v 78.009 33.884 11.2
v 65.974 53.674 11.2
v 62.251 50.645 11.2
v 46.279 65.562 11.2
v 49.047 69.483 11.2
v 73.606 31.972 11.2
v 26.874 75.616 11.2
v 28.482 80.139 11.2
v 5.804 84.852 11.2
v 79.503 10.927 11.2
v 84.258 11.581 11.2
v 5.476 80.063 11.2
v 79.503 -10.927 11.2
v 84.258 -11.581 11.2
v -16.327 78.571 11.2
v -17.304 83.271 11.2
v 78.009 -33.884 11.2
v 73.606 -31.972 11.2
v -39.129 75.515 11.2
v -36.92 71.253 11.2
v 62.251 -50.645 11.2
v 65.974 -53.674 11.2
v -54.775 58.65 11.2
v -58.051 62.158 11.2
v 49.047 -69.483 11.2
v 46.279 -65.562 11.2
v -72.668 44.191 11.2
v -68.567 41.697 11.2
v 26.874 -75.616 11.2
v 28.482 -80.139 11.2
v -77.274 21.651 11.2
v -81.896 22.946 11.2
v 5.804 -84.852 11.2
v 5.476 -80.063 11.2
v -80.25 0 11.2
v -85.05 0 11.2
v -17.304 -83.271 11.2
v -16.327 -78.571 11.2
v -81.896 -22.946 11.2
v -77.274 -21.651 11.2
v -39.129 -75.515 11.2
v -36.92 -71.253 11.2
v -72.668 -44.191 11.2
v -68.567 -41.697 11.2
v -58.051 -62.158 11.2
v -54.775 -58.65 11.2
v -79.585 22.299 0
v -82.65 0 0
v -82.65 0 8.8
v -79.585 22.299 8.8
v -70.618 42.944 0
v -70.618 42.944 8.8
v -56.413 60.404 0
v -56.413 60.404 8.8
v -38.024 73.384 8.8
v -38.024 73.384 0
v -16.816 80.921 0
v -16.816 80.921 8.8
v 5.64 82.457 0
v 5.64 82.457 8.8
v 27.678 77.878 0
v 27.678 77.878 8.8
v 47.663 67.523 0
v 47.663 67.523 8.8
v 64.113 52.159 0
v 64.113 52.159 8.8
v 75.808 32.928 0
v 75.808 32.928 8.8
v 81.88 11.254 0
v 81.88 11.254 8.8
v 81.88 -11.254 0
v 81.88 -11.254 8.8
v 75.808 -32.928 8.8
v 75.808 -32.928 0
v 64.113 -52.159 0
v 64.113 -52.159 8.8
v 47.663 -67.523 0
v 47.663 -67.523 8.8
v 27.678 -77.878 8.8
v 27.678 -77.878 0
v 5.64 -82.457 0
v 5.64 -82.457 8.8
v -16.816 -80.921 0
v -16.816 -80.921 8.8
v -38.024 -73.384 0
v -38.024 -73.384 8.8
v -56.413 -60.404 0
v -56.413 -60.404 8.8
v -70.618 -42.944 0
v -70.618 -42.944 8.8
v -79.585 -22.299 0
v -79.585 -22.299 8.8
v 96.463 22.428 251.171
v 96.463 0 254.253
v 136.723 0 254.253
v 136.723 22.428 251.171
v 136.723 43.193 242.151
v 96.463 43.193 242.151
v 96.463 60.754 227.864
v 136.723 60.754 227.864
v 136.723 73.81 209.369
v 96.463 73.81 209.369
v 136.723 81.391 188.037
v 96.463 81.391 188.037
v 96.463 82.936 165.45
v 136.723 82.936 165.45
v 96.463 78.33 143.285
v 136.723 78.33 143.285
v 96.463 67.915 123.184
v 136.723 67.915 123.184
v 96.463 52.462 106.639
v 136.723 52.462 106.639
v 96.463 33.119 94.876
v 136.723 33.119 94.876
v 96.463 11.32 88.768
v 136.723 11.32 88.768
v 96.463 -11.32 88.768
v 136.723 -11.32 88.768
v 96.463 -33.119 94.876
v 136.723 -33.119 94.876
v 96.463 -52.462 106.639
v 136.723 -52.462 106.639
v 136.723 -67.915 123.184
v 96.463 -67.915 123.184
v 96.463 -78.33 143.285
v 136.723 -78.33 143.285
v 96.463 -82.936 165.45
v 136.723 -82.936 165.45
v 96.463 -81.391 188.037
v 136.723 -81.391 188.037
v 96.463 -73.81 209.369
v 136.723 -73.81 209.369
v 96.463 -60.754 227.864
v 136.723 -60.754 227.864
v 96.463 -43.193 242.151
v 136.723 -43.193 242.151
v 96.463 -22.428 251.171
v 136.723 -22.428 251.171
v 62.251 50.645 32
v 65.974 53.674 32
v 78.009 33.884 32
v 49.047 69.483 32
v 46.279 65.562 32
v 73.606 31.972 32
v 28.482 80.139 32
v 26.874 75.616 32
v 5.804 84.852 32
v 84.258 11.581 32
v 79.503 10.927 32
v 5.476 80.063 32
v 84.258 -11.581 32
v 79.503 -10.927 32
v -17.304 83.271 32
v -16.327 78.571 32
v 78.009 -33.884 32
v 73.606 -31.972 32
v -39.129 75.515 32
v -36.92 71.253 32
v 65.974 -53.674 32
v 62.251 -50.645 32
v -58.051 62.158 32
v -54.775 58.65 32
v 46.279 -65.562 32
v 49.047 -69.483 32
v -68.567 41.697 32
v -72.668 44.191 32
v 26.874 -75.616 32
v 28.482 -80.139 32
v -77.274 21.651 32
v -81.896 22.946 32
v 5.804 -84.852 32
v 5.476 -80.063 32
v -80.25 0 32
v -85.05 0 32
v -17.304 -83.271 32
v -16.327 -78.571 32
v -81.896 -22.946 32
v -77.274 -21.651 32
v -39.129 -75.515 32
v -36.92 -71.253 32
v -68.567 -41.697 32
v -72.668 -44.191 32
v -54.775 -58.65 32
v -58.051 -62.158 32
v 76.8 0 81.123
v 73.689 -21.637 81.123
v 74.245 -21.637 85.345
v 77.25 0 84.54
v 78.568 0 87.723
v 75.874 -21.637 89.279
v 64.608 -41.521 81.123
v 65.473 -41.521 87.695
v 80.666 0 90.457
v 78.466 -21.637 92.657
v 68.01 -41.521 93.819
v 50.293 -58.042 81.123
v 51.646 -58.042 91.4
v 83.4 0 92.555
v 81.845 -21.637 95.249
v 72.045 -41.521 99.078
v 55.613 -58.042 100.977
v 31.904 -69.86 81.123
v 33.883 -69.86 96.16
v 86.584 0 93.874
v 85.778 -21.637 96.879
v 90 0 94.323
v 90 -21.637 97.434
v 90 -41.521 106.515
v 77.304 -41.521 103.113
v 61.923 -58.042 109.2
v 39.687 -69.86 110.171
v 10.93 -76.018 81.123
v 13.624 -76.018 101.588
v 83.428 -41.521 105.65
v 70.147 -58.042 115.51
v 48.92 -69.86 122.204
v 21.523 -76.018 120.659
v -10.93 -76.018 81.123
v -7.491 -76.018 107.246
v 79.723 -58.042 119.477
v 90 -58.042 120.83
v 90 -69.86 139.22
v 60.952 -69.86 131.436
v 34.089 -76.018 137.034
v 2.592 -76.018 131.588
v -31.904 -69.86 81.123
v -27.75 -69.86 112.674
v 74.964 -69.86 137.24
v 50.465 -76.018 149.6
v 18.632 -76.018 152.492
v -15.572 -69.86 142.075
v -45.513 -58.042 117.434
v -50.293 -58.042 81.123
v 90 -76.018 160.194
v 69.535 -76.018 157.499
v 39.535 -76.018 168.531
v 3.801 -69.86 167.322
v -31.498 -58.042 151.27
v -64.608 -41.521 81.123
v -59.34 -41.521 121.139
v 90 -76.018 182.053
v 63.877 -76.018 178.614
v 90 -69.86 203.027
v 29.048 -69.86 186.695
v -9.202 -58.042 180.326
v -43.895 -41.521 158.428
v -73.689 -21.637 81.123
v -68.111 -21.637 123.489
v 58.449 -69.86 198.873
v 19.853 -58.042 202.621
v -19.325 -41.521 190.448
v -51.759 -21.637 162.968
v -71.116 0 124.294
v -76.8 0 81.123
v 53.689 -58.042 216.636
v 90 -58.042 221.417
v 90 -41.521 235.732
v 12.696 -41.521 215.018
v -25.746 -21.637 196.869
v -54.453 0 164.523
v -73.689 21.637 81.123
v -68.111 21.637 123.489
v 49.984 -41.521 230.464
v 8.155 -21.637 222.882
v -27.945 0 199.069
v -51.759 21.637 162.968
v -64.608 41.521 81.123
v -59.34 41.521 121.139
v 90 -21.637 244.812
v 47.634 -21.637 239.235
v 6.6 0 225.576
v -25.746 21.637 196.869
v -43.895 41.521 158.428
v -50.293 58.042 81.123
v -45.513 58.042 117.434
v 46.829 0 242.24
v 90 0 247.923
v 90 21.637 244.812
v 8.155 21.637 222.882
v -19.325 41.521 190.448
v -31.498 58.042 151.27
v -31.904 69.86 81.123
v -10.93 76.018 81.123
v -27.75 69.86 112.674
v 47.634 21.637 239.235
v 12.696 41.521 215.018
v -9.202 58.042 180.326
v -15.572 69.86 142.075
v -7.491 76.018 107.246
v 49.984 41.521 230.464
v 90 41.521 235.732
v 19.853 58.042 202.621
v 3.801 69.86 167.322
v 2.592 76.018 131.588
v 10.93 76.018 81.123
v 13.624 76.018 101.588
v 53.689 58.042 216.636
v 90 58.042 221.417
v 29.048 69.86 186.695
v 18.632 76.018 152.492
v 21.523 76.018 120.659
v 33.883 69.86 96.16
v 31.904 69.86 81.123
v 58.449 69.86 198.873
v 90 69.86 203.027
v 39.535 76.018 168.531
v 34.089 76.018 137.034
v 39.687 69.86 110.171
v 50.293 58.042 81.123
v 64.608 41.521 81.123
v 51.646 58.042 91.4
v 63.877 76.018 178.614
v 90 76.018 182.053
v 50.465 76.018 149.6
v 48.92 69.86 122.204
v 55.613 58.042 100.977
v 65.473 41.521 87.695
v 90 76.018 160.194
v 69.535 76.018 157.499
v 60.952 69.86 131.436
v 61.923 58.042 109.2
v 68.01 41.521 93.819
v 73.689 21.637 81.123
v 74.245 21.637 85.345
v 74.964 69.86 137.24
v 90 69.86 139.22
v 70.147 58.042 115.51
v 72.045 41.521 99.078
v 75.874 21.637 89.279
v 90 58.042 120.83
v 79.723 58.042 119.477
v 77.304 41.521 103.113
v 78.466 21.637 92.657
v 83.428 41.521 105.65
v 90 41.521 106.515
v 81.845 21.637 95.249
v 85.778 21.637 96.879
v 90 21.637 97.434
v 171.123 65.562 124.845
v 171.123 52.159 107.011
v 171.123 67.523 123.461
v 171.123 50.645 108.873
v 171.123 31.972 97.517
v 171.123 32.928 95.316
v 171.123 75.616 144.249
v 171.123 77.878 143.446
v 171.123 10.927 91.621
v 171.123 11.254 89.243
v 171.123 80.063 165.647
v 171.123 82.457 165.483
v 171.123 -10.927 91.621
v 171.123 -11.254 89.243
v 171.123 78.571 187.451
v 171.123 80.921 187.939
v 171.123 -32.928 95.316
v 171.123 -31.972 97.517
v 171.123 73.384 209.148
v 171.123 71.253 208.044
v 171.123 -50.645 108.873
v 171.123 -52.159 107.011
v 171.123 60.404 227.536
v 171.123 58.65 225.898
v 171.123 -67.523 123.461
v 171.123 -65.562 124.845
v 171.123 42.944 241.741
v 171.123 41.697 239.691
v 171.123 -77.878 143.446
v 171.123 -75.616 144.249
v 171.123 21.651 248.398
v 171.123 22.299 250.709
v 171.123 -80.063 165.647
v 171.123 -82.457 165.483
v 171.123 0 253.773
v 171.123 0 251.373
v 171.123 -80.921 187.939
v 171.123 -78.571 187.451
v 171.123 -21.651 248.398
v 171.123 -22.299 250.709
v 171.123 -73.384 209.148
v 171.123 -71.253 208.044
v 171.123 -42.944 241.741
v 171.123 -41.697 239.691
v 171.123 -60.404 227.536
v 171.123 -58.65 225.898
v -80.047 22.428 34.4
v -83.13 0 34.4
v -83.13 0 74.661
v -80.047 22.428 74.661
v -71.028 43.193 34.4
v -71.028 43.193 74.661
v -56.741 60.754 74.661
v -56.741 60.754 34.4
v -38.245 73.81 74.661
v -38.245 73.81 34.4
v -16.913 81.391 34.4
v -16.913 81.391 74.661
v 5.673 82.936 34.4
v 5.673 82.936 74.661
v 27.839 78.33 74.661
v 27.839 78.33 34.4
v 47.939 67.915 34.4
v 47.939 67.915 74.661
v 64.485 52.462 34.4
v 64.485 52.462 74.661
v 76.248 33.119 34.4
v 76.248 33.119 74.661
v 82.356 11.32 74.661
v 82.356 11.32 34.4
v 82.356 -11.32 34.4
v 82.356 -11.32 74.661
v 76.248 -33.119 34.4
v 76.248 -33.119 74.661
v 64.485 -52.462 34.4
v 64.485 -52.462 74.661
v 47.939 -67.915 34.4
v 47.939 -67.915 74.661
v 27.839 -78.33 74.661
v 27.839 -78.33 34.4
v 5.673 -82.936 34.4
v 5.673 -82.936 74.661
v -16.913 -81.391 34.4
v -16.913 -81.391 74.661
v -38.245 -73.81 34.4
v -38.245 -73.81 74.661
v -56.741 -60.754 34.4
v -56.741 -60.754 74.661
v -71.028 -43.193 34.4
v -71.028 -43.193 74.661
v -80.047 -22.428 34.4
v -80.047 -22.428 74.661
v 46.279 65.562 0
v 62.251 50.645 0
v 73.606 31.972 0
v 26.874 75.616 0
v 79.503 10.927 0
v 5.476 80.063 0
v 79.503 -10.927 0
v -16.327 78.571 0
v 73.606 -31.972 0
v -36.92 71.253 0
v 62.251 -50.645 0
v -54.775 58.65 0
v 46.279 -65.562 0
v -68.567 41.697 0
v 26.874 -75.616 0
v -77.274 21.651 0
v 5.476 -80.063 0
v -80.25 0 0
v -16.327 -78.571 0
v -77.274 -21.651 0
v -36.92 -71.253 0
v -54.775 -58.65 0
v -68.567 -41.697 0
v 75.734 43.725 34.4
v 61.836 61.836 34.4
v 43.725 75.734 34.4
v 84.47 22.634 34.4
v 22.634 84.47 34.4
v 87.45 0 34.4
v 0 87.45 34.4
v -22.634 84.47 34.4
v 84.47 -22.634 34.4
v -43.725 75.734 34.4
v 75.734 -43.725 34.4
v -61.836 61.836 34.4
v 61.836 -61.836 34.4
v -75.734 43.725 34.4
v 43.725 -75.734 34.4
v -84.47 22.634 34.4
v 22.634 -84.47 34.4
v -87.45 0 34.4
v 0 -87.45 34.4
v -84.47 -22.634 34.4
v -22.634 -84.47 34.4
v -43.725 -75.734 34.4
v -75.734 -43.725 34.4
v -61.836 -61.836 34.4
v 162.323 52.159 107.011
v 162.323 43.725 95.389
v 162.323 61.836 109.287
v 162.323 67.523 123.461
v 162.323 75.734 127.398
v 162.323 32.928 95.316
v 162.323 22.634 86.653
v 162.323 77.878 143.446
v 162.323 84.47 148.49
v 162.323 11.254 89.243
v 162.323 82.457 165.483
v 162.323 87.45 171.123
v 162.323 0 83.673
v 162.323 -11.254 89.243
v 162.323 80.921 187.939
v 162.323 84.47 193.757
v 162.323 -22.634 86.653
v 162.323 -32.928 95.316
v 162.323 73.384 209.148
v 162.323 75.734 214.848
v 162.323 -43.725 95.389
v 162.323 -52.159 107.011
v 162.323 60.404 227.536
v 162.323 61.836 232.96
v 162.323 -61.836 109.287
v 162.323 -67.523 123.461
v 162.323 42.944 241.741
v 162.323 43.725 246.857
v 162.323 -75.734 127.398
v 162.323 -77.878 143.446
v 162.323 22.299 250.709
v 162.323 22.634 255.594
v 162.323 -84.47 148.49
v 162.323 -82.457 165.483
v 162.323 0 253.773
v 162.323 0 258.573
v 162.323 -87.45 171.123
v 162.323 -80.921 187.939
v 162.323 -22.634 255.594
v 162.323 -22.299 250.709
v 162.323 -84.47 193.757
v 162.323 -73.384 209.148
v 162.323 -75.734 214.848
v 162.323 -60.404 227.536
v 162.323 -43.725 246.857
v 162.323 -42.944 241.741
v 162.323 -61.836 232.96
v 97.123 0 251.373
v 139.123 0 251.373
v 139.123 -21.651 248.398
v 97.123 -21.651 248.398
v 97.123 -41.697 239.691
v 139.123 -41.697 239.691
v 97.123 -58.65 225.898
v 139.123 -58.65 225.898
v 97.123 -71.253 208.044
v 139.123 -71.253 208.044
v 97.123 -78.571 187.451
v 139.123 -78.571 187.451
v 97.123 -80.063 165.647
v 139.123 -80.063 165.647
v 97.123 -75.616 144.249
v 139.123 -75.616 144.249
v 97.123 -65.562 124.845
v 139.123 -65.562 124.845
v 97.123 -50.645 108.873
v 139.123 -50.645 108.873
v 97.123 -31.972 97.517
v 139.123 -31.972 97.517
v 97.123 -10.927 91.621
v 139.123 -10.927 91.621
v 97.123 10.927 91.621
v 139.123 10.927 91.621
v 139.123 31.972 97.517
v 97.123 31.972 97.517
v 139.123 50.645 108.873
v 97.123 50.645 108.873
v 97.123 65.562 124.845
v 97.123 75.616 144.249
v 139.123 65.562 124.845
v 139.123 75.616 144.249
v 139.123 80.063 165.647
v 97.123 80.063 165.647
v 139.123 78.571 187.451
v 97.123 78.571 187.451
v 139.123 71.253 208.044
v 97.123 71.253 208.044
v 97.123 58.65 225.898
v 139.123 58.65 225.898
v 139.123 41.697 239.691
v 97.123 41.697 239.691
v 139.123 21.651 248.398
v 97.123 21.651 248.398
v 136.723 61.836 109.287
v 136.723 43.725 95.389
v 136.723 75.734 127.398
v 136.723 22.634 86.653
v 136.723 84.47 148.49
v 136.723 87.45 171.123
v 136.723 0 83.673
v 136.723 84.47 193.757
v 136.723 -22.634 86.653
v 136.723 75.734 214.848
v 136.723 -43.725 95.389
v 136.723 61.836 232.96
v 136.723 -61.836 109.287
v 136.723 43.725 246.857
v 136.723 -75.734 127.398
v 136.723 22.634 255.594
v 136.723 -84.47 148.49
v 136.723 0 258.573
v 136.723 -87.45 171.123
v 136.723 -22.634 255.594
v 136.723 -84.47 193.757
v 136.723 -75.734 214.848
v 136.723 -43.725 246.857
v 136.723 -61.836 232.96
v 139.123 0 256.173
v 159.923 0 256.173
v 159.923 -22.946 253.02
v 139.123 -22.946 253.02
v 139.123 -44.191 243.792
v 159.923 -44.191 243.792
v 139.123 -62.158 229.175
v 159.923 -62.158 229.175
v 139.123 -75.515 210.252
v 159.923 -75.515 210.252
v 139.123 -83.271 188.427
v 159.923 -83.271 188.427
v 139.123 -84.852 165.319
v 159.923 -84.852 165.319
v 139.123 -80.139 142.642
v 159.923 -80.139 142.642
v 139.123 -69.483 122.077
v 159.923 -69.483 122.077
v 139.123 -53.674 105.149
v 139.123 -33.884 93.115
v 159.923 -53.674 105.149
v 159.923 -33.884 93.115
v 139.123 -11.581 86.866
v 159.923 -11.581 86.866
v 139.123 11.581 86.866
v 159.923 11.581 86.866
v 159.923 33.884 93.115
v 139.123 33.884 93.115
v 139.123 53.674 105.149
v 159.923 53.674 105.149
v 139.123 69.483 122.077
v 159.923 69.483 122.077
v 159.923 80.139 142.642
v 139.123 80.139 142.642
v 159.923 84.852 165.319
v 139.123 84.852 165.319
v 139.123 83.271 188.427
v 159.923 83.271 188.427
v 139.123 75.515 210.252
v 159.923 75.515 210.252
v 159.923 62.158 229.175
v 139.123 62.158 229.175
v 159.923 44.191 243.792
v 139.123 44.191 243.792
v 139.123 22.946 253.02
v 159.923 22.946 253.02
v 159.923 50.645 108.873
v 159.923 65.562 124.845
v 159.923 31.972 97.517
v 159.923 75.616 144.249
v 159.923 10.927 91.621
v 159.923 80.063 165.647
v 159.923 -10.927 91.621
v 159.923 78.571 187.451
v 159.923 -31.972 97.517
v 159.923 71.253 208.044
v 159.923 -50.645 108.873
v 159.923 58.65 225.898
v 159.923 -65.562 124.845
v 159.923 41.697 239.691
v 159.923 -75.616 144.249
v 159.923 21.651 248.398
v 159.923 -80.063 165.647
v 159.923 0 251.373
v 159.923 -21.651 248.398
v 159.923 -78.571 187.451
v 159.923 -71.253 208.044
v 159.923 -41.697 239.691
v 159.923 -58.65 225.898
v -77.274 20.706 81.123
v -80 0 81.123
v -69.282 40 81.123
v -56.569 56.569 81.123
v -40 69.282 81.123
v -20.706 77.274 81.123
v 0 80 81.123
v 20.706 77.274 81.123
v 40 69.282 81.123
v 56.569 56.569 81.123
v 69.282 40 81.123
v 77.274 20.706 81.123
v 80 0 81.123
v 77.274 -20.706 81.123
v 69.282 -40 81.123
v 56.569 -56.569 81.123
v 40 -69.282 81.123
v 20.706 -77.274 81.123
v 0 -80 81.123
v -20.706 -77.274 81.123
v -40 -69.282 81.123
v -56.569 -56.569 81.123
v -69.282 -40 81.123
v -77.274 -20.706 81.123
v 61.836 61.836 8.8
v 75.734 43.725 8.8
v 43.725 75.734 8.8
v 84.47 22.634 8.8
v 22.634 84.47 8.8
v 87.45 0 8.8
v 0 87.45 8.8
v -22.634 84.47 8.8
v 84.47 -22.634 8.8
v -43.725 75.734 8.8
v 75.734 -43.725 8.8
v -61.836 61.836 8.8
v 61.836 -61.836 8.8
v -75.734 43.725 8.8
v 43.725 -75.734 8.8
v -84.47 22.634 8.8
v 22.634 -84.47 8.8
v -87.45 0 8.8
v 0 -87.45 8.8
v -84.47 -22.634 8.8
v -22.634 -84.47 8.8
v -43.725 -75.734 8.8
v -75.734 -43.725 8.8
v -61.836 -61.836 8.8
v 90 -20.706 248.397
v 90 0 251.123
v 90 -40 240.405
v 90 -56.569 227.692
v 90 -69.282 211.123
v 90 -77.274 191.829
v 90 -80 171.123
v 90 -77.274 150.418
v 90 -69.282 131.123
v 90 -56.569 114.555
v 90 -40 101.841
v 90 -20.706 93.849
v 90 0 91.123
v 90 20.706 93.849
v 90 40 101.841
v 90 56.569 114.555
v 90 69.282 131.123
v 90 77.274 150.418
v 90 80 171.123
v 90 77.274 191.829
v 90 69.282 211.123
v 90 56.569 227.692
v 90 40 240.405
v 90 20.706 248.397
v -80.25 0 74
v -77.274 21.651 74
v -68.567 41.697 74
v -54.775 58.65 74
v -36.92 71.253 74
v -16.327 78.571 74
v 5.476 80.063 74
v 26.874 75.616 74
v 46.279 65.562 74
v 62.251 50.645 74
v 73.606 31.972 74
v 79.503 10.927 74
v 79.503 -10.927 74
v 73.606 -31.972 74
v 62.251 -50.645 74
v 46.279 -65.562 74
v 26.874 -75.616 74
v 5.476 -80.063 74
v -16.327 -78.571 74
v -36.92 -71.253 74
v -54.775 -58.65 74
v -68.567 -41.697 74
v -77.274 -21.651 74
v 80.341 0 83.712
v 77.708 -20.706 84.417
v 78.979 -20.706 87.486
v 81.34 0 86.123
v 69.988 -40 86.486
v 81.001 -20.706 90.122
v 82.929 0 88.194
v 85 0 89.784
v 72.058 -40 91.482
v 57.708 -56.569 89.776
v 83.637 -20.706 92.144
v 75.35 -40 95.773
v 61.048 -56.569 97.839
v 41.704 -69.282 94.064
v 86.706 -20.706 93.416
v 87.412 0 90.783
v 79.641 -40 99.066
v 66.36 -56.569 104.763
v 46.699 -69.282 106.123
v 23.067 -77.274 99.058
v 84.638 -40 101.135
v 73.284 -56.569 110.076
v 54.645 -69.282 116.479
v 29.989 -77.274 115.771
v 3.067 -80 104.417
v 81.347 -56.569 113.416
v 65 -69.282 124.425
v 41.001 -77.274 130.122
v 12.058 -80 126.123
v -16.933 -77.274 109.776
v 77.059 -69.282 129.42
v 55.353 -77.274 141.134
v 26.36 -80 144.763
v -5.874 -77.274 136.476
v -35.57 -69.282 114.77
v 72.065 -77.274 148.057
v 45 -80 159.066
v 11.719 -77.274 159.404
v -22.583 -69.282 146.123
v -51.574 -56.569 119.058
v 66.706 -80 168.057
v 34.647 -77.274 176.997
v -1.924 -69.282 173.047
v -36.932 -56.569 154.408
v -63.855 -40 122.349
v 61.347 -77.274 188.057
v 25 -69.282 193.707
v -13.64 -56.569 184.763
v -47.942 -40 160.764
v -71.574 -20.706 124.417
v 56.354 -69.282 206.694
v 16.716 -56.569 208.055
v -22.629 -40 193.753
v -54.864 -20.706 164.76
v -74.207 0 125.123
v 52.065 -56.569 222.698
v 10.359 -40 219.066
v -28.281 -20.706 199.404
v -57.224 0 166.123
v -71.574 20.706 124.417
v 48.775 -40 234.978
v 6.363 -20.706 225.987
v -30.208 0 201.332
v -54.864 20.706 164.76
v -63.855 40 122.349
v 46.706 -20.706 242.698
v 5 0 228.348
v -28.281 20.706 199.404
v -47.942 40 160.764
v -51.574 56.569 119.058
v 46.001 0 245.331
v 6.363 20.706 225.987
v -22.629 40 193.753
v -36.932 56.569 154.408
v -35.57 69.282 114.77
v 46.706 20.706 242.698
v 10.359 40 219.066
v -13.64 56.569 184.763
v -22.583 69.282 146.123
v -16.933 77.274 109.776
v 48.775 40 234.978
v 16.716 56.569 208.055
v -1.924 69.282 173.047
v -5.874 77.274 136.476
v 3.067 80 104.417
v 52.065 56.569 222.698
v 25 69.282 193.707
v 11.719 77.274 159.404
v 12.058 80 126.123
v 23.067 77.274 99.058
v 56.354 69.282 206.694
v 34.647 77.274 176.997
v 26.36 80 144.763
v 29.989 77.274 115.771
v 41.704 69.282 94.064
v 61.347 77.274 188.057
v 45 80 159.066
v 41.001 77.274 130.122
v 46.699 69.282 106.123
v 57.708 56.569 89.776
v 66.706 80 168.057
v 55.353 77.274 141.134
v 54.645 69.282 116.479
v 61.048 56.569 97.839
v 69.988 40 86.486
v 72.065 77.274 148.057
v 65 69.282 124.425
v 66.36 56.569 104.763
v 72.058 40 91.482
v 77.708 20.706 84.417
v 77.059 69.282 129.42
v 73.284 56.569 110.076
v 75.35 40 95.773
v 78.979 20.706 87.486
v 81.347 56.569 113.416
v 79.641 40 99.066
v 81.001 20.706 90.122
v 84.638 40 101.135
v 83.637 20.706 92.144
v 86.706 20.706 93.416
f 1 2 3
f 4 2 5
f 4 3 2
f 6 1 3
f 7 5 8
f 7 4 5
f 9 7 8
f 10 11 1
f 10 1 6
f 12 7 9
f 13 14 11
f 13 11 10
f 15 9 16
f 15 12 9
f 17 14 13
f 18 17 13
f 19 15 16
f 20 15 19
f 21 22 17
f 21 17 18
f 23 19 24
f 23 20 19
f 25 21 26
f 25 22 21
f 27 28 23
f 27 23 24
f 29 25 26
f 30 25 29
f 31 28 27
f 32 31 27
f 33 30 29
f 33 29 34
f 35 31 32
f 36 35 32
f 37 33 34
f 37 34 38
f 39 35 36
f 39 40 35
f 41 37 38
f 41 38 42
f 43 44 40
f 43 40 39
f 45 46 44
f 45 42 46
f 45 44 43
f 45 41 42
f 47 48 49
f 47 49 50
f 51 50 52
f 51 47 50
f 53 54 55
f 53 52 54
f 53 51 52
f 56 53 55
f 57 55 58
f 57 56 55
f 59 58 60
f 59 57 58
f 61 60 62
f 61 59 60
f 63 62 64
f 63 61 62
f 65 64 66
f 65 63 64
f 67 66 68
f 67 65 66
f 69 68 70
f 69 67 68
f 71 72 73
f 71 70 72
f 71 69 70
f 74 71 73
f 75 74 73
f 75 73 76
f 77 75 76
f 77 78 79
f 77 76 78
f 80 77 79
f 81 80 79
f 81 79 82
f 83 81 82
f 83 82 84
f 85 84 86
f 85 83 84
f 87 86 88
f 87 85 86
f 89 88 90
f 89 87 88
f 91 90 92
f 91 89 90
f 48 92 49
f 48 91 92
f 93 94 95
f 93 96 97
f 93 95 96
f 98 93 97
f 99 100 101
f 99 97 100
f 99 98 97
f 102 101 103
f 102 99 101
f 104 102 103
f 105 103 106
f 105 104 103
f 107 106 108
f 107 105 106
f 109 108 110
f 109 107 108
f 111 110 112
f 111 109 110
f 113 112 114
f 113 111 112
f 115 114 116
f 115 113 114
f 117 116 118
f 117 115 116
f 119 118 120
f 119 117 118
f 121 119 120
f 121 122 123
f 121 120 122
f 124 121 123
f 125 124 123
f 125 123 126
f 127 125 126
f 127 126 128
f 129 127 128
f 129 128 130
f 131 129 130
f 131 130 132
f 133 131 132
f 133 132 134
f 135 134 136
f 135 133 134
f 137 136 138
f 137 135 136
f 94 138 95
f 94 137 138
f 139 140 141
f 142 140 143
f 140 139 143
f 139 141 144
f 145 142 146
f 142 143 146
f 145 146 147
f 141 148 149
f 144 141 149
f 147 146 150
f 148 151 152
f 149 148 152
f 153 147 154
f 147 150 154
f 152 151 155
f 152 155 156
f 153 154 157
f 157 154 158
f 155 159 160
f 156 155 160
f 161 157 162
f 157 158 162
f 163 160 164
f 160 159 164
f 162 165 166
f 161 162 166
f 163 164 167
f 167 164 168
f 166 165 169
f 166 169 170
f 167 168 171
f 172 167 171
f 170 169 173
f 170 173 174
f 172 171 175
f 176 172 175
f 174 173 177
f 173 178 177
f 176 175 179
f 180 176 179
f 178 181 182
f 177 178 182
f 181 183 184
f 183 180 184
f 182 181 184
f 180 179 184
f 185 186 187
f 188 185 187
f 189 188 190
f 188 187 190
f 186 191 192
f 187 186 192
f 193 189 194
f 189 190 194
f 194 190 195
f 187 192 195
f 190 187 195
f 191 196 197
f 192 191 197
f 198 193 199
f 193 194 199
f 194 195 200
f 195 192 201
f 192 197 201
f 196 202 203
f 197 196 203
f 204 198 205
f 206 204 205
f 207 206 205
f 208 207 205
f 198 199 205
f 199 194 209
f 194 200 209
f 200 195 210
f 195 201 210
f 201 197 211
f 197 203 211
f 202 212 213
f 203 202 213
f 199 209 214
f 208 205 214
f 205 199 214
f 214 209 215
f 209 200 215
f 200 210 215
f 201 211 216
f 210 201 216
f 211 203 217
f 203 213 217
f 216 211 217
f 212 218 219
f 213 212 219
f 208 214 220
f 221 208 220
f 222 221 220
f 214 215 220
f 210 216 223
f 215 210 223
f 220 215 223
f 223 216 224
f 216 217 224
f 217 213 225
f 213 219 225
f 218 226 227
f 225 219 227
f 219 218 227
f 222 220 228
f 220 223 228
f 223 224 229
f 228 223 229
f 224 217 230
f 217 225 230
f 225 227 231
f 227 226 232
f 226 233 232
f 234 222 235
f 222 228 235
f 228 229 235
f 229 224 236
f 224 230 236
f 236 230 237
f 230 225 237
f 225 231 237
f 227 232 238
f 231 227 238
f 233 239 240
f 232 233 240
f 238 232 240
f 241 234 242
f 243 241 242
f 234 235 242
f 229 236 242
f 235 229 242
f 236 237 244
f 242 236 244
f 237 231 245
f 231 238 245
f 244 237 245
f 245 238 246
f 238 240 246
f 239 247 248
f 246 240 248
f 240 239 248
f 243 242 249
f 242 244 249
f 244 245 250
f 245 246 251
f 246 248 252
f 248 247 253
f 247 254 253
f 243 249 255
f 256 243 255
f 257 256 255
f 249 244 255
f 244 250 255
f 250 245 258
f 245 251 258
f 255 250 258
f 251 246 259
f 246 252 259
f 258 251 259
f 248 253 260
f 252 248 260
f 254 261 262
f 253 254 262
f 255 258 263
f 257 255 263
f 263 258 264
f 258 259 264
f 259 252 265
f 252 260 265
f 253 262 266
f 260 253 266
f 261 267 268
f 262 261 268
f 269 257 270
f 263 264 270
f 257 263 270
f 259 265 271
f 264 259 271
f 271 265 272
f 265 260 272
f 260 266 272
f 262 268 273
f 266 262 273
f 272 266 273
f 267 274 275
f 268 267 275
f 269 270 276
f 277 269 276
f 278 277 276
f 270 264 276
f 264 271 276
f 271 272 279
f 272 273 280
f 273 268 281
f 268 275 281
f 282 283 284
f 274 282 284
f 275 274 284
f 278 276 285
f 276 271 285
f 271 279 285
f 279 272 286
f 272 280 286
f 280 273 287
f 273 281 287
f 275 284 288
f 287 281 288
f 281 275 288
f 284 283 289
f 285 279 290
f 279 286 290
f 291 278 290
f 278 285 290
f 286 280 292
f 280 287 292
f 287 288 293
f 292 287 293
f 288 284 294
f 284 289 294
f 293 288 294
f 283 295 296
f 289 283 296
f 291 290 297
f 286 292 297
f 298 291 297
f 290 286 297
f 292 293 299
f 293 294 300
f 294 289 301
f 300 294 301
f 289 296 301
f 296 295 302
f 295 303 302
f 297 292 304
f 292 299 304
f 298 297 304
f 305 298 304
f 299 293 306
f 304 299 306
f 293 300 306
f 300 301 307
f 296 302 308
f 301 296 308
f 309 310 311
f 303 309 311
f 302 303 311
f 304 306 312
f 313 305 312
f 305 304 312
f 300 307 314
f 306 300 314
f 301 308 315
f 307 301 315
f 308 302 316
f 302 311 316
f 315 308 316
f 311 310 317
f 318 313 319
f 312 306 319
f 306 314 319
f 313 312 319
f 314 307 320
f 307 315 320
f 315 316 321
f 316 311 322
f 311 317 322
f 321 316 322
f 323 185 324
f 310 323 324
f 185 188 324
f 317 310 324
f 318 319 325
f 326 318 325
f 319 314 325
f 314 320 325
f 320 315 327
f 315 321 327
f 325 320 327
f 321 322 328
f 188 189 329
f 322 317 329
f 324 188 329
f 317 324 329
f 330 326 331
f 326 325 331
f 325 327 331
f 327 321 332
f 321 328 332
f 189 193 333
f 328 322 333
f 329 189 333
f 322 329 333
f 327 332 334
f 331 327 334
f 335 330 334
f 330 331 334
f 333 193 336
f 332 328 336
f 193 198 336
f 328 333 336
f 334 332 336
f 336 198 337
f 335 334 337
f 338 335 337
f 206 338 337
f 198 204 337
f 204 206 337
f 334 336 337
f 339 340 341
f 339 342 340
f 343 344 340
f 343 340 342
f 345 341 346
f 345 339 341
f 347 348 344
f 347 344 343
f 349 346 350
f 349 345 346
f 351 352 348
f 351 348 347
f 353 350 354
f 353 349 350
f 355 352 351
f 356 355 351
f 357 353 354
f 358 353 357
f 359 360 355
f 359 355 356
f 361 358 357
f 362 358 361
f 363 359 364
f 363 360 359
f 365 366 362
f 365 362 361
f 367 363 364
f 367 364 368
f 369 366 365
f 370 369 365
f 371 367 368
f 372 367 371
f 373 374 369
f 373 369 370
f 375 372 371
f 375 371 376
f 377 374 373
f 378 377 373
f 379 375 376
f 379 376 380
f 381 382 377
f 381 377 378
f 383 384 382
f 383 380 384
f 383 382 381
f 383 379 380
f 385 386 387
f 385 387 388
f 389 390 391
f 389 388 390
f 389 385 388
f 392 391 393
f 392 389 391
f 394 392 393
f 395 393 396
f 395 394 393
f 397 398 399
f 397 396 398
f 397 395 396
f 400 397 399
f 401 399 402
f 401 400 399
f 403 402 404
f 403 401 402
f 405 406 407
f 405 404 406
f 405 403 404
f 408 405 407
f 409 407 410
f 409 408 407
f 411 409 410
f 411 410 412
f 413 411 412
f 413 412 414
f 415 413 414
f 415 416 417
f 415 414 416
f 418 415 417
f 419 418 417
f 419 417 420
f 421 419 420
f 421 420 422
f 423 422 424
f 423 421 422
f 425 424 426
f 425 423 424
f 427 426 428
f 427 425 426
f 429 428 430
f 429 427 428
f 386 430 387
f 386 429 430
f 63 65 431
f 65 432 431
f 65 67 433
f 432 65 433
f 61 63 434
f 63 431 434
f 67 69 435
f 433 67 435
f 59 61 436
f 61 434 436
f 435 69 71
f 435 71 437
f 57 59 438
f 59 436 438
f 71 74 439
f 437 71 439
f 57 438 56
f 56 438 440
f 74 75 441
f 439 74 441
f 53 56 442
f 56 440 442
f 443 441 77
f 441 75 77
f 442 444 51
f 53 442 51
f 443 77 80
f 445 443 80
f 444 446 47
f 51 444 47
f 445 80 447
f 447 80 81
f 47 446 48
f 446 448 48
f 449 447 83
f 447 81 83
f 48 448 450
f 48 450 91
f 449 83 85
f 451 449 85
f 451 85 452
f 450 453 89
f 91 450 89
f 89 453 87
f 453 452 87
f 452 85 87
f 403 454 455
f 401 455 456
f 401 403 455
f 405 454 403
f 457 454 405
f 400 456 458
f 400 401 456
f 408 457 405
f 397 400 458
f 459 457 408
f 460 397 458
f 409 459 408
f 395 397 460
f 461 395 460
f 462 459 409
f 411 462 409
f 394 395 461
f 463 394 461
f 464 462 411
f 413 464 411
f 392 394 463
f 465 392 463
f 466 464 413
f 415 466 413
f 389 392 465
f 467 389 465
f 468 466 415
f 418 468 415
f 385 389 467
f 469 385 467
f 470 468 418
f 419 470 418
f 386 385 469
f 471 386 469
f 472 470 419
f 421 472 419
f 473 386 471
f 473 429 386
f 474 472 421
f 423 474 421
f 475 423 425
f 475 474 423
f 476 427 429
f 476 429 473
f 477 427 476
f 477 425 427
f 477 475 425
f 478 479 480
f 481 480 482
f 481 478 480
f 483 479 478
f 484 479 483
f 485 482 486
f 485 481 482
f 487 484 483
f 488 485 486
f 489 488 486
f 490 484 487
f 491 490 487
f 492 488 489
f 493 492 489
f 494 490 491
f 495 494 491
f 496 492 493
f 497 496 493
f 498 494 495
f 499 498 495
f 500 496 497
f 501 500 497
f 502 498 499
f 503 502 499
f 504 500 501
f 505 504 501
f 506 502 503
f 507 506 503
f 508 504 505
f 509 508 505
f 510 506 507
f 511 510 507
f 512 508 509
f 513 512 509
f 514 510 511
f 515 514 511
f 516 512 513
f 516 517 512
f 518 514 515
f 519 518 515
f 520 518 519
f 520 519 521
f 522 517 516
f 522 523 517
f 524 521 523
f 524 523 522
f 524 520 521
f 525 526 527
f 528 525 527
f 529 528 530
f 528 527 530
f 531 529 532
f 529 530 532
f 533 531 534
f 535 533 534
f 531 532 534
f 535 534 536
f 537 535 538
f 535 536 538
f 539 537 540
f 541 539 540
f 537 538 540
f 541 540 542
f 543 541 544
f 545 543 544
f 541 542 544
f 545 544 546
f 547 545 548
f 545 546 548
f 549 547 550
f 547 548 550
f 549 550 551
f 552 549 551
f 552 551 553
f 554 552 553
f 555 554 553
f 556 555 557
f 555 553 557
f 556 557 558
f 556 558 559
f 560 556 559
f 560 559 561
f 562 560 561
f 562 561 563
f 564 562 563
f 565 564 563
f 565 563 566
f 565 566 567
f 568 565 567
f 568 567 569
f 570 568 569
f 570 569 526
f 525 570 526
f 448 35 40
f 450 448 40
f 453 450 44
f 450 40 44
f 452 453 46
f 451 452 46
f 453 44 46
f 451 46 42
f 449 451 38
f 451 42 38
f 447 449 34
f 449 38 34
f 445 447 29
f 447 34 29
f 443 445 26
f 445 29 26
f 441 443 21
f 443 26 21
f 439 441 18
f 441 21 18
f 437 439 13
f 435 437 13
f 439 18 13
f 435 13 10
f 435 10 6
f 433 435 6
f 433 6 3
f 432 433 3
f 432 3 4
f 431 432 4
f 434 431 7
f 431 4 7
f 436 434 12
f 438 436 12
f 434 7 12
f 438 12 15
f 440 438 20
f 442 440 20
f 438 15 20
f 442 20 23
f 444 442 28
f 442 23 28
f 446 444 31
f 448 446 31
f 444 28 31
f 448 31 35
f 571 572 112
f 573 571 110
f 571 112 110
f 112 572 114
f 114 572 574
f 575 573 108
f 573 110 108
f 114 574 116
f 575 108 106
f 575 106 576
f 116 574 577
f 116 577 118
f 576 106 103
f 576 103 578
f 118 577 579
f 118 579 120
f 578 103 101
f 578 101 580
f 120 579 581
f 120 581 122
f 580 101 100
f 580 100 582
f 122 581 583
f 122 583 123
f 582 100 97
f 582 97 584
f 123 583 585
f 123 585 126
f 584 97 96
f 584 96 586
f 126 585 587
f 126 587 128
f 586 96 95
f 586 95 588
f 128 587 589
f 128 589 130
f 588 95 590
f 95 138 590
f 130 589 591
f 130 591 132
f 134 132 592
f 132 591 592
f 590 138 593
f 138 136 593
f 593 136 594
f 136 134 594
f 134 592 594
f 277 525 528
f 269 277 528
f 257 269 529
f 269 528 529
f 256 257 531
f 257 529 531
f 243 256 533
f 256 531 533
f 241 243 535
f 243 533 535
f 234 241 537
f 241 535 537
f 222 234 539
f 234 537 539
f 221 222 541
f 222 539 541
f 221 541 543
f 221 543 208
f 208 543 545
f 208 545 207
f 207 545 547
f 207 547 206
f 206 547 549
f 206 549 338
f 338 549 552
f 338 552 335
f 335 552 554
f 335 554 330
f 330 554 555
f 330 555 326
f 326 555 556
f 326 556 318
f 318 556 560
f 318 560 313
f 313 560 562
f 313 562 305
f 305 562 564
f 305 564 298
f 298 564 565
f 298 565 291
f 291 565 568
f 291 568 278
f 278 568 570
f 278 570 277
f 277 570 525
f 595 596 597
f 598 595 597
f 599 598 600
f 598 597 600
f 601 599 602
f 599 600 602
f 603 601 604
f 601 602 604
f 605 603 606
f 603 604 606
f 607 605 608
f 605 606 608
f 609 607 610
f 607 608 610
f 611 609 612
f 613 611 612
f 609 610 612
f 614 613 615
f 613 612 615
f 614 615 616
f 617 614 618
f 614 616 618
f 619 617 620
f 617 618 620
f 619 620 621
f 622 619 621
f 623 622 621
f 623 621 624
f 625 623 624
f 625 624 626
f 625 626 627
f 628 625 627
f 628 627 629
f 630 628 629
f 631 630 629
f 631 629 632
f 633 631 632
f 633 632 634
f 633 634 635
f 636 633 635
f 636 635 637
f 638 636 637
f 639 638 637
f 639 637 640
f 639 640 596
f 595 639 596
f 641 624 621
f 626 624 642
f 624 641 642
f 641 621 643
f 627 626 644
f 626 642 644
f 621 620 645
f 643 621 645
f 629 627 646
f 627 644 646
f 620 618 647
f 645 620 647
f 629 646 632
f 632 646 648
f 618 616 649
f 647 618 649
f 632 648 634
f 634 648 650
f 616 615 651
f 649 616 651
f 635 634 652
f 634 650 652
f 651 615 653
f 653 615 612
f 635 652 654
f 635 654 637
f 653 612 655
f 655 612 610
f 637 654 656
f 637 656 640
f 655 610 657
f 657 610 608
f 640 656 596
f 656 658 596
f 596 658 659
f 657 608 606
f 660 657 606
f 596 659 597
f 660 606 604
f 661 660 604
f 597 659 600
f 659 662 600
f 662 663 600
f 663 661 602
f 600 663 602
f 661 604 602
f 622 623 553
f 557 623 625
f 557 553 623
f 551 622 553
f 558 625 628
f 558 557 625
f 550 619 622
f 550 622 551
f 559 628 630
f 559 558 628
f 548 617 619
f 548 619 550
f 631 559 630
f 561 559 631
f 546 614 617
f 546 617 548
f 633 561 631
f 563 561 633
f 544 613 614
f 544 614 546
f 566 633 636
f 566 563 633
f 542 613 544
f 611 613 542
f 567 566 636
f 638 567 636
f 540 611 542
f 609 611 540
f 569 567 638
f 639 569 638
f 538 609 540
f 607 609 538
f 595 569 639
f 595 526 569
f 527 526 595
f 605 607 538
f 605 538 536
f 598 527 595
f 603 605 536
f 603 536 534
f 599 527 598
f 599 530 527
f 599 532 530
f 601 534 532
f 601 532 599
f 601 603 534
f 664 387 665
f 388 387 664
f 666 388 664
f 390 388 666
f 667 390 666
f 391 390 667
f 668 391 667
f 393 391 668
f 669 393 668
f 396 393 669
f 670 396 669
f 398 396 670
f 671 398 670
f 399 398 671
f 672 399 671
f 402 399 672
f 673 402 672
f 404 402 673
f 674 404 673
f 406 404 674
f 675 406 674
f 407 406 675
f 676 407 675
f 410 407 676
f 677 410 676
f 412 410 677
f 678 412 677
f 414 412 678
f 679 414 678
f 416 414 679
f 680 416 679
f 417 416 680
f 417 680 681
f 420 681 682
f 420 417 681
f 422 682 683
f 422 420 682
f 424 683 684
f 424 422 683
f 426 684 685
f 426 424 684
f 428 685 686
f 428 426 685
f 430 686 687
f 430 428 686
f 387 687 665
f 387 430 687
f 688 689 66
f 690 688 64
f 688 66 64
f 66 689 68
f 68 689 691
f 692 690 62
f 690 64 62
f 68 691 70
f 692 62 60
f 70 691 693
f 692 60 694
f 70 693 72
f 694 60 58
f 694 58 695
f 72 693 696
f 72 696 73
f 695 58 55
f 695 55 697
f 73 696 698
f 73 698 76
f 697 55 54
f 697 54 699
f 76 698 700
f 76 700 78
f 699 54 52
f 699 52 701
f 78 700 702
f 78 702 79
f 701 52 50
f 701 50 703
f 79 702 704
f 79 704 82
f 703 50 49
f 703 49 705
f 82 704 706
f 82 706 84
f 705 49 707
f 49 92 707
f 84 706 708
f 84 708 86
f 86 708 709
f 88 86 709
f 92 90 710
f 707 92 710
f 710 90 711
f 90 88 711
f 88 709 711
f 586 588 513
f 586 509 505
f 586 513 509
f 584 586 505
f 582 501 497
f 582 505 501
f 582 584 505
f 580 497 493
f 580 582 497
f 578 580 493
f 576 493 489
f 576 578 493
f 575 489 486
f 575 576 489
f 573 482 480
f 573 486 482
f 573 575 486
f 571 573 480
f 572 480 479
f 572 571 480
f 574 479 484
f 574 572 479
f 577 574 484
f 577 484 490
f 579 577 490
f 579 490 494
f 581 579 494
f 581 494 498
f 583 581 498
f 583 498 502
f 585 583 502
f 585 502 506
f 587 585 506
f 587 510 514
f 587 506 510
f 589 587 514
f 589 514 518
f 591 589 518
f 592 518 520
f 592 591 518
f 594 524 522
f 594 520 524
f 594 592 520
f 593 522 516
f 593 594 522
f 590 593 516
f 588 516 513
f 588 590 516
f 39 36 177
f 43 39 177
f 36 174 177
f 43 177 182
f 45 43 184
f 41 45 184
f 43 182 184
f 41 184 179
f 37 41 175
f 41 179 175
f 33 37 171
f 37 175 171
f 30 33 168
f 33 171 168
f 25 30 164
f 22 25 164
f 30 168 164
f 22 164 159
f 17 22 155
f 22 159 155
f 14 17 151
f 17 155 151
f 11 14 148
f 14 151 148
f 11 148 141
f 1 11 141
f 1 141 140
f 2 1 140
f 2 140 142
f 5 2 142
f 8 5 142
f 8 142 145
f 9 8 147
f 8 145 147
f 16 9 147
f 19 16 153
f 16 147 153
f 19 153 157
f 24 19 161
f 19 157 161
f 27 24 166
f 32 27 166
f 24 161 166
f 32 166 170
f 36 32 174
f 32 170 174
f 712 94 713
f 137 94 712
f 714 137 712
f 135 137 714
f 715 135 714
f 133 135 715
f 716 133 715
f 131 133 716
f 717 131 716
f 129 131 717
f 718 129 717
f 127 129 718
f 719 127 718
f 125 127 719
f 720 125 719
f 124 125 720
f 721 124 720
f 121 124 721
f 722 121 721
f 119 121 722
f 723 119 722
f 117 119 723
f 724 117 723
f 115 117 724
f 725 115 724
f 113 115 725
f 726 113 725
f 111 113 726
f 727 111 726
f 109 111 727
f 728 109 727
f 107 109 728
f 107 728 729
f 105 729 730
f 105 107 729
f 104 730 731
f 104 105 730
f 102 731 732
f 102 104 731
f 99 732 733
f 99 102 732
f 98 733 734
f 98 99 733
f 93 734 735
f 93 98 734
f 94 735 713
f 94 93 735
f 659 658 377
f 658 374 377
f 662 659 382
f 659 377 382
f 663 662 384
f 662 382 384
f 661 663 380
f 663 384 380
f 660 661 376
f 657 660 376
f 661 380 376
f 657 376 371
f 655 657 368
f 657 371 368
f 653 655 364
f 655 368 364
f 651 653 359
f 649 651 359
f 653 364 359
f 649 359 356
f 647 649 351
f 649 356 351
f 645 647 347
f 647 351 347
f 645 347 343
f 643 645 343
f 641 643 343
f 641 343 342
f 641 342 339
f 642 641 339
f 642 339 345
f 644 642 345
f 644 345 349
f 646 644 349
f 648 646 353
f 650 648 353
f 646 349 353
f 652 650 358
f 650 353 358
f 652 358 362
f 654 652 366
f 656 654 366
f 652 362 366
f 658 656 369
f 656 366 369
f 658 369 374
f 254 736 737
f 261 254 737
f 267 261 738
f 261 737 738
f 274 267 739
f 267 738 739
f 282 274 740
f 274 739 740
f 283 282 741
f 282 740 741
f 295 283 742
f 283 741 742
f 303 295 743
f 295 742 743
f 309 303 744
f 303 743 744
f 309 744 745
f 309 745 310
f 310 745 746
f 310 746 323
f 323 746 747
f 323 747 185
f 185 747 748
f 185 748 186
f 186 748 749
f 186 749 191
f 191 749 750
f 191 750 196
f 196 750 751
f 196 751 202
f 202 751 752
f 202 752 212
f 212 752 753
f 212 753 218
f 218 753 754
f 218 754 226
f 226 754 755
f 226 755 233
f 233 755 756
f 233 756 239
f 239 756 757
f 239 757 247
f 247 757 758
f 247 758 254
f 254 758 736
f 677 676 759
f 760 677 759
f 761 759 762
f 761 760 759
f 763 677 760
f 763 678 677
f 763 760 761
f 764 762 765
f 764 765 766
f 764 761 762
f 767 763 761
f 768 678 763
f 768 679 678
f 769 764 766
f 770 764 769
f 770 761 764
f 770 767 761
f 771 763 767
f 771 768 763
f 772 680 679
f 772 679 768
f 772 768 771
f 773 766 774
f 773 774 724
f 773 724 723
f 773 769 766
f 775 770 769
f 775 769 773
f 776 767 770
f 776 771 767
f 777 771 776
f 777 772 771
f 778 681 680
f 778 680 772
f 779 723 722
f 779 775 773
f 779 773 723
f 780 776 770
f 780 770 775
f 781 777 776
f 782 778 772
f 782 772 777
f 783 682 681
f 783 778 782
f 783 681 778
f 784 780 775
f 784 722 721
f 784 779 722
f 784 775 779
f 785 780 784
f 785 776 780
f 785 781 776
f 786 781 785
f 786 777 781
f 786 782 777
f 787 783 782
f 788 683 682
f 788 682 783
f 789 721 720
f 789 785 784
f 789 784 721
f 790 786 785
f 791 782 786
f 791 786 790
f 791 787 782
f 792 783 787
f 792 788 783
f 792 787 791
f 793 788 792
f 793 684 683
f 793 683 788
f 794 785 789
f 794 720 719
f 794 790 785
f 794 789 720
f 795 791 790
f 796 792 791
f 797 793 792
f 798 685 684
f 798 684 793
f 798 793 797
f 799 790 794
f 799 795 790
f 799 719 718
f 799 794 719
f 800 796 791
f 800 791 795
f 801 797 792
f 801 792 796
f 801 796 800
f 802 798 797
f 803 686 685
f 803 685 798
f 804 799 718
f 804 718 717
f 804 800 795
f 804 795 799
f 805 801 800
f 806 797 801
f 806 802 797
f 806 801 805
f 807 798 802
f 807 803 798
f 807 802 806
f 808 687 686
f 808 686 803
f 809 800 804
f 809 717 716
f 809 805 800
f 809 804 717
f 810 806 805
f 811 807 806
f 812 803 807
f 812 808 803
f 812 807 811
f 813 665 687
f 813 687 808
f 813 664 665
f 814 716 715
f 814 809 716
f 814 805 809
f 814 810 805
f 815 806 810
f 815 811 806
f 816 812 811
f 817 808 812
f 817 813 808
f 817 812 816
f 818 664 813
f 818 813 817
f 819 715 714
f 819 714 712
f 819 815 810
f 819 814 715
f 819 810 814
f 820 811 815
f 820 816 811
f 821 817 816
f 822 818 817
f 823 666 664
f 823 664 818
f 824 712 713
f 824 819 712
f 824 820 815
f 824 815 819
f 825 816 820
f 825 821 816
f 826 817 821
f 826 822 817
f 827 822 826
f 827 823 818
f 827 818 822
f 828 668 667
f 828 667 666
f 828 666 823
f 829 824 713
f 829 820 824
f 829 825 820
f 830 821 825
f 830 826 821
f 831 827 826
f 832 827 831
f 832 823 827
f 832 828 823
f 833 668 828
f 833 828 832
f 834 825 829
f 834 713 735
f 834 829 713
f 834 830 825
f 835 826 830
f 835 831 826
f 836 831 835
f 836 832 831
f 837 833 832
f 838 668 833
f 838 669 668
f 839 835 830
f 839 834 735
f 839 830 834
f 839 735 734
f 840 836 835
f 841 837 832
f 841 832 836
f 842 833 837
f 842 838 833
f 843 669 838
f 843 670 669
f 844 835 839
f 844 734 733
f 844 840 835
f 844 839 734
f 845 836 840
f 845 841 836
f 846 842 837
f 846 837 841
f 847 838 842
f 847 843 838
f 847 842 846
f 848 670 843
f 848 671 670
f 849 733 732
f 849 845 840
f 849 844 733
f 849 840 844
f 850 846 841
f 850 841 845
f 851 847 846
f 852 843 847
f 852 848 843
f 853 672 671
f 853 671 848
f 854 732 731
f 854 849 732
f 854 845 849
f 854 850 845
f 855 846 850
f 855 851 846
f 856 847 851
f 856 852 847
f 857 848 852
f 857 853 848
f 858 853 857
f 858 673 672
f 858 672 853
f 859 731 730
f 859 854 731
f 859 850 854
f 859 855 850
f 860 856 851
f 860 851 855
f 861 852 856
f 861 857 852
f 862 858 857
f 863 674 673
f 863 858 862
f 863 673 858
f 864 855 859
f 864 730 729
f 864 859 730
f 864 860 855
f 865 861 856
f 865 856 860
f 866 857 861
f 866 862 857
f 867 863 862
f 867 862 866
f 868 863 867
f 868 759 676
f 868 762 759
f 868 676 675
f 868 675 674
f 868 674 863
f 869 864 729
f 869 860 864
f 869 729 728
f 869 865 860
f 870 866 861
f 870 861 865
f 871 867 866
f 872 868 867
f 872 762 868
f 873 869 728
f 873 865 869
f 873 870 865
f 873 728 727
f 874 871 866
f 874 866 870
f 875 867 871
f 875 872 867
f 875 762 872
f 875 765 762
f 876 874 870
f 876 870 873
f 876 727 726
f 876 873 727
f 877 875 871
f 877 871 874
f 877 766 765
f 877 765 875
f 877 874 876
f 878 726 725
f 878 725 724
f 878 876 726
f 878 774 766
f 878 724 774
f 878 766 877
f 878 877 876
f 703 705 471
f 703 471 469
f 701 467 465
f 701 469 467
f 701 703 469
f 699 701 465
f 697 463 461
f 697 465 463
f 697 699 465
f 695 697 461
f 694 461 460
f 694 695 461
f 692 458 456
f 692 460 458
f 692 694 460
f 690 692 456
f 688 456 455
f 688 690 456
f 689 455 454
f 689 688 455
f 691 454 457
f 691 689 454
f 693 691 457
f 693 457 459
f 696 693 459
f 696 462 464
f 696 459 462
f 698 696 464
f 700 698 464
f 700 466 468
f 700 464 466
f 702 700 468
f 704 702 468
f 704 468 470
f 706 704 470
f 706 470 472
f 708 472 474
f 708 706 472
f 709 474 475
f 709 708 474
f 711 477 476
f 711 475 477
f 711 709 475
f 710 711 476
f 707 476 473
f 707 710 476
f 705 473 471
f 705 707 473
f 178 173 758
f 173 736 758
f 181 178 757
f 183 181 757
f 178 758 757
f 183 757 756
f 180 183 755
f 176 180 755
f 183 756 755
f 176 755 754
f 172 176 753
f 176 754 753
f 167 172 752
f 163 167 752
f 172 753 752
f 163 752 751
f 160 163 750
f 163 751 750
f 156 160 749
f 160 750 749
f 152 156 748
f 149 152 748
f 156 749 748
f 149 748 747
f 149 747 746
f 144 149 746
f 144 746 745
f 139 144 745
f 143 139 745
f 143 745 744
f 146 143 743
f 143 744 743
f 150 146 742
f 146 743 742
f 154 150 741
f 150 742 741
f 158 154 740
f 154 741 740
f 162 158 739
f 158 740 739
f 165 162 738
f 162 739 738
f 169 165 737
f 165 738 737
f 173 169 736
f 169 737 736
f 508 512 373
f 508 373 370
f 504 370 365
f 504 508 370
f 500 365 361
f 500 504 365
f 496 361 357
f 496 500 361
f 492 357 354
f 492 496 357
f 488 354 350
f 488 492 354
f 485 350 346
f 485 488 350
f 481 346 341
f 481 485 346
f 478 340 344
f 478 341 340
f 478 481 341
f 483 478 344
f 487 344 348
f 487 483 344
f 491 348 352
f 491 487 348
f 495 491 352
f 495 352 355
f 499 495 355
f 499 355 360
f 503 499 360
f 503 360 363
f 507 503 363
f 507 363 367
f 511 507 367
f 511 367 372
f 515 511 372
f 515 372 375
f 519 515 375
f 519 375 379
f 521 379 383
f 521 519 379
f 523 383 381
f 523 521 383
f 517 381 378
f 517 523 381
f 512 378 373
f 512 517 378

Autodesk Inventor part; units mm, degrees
ref_plane "YZ Plane" through (0, 0, 0) normal (1, 0, 0) x (0, 1, 0)
ref_plane "XZ Plane" through (0, 0, 0) normal (0, 1, 0) x (-1, 0, 0)
ref_plane "XY Plane" through (0, 0, 0) normal (0, 0, 1) x (1, 0, 0)
sketch "Sketch1" plane through (0, 0, 0) normal (0, 1, 0) x (-1, 0, 0)
  line L0 (0, 0) -> (0, 81.1234)
  line L1 (76.8, 81.1234) -> (80, 81.1234)
  line L2 (0, 81.1234) -> (76.8, 81.1234) construction
  line L3 (80, 81.1234) -> (83.13, 74.6607)
  line L4 (83.13, 34.4) -> (87.45, 34.4)
  line L5 (87.45, 34.4) -> (87.45, 8.8)
  line L6 (87.45, 8.8) -> (82.65, 8.8)
  line L7 (82.65, 8.8) -> (82.65, 0)
  line L8 (82.65, 0) -> (80.25, 0)
  line L9 (80.25, 0) -> (80.25, 11.2)
  line L10 (80.25, 11.2) -> (85.05, 11.2)
  line L11 (85.05, 11.2) -> (85.05, 32)
  line L12 (85.05, 32) -> (80.25, 32)
  line L13 (80.25, 32) -> (80.25, 74)
  line L14 (80.25, 74) -> (76.8, 81.1234)
  line L15 (80.25, 0) -> (0, 0) construction
  line L16 (83.13, 74.6607) -> (83.13, 34.4)
  line L17 (0, 81.1234) -> (0, 171.1234) construction
  line L18 (0, 171.1234) -> (-90, 171.1234) construction
  line L19 (-90, 171.1234) -> (-171.1234, 171.1234) construction
  line L20 (-171.1234, 171.1234) -> (-171.1234, 251.3734) construction
  line L21 (-171.1234, 251.3734) -> (-171.1234, 253.7734)
  line L22 (-171.1234, 253.7734) -> (-162.3234, 253.7734)
  line L23 (-162.3234, 253.7734) -> (-162.3234, 258.5734)
  line L24 (-162.3234, 258.5734) -> (-136.7234, 258.5734)
  line L25 (-136.7234, 258.5734) -> (-136.7234, 254.2534)
  line L26 (-136.7234, 254.2534) -> (-96.4626, 254.2534)
  line L27 (-96.4626, 254.2534) -> (-90, 251.1234)
  line L28 (-90, 251.1234) -> (-90, 247.9234)
  line L29 (-90, 247.9234) -> (-97.1234, 251.3734)
  line L30 (-97.1234, 251.3734) -> (-139.1234, 251.3734)
  line L31 (-139.1234, 251.3734) -> (-139.1234, 256.1734)
  line L32 (-139.1234, 256.1734) -> (-159.9234, 256.1734)
  line L33 (-159.9234, 256.1734) -> (-159.9234, 251.3734)
  line L34 (-159.9234, 251.3734) -> (-171.1234, 251.3734)
  line L35 (-90, 247.9234) -> (-90, 171.1234) construction
  line L36 (80.25, 74) -> (0, 74) construction
  line L37 (-97.1234, 251.3734) -> (-97.1234, 171.1234) construction
  dimension "d0" = 2.4
  dimension "d1" = 2.4
  dimension "d2" = 2.4
  dimension "d4" = 2.88
  dimension "d5" = 2.4
  dimension "d6" = 7.2
  dimension "d7" = 160.5
  dimension "d8" = 32
  dimension "d9" = 42
  dimension "d11" = 11.2
  dimension "d12" = 160
  dimension "d13" = 3.2
  dimension "d14" = 2.88
  dimension "d17" = 160.5
  dimension "d18" = 2.4
  dimension "d19" = 2.4
  dimension "d20" = 2.4
  dimension "d21" = 2.4
  dimension "d22" = 4.8
  dimension "d23" = 2.88
  dimension "d24" = 3.2
  dimension "d25" = 160
  dimension "d26" = 11.2
  dimension "d27" = 32
  dimension "d28" = 42
  dimension "d29" = 90
  dimension "d30" = 90
  dimension "d31" = 2.88
revolve "Revolution1" add sketch "Sketch1" angle 360 about axis through (0, 0, 0) along (0, 0, 1) contours L1 L3 L16 L4 L5 L6 L7 L8 L9 L10 L11 L12 L13 L14
sketch "Sketch2" plane through (0, 0, 81.1234) normal (0, 0, 1) x (1, 0, 0)
  circle A0 centre (0, 0) radius 80 projected
  circle A1 centre (0, 0) radius 80
  circle A2 centre (0, 0) radius 76.8
  circle A3 centre (0, 0) radius 76.8 projected
sketch "Sketch3" plane through (0, 0, 0) normal (0, 1, 0) x (-1, 0, 0)
  line L0 (-80, 81.1234) -> (80, 81.1234) projected
  line L1 (0, 81.1234) -> (0, 171.1234) construction
  line L2 (0, 171.1234) -> (-90, 171.1234) construction
  arc A0 (0, 81.1234) -> (-90, 171.1234) centre (-90, 81.1234) ccw
  dimension "d15" = 90
  dimension "d16" = 90
sweep "Sweep1" add profiles "Sketch2" path "Sketch3" path curves A0
revolve "Revolution2" add sketch "Sketch1" angle 360 about axis through (90, 0, 171.1234) along (1, 0, 0) contours L21 L22 L23 L24 L25 L26 L27 L28 L29 L30 L31 L32 L33 L34
equation "\"d0\" = e3"
equation "\"d1\" = e3"
equation "\"d2\" = e3"
equation "\"d4\" = e2"
equation "\"d5\" = e3"
equation "\"d6\" = 3 * e3"
equation "\"d7\" = Ds"
equation "\"d8\" = C1"
equation "\"d9\" = A"
equation "\"d11\" = 0.35 * C1"
equation "\"d12\" = De"
equation "\"d13\" = e"
equation "\"d14\" = e2"
equation "\"d17\" = Ds"
equation "\"d18\" = e3"
equation "\"d19\" = e3"
equation "\"d20\" = e3"
equation "\"d21\" = e3"
equation "\"d22\" = 2 * e3"
equation "\"d23\" = e2"
equation "\"d24\" = e"
equation "\"d25\" = De"
equation "\"d26\" = 0.35 * C1"
equation "\"d27\" = C1"
equation "\"d28\" = A"
equation "\"d29\" = z"
equation "\"d30\" = z"
equation "\"d31\" = e2"
equation "\"d15\" = z"
equation "\"d16\" = z"
equation "\"z\" = 90"
equation "\"De\" = 160"
equation "\"e\" = 3.2"
equation "\"Ds\" = 160.5"
equation "\"e2\" = 0.9 * e"
equation "\"C1\" = 32"
equation "\"e3\" = 0.75 * e"
equation "\"A\" = 42"
equation "\"Size_Designation\" = 1.2345"
properties part number "ISO 3633 90 Deg Bend with Only Sockets for Elastormeric Sealing Ring Joints DN160" material "PVC, Unplasticized"
